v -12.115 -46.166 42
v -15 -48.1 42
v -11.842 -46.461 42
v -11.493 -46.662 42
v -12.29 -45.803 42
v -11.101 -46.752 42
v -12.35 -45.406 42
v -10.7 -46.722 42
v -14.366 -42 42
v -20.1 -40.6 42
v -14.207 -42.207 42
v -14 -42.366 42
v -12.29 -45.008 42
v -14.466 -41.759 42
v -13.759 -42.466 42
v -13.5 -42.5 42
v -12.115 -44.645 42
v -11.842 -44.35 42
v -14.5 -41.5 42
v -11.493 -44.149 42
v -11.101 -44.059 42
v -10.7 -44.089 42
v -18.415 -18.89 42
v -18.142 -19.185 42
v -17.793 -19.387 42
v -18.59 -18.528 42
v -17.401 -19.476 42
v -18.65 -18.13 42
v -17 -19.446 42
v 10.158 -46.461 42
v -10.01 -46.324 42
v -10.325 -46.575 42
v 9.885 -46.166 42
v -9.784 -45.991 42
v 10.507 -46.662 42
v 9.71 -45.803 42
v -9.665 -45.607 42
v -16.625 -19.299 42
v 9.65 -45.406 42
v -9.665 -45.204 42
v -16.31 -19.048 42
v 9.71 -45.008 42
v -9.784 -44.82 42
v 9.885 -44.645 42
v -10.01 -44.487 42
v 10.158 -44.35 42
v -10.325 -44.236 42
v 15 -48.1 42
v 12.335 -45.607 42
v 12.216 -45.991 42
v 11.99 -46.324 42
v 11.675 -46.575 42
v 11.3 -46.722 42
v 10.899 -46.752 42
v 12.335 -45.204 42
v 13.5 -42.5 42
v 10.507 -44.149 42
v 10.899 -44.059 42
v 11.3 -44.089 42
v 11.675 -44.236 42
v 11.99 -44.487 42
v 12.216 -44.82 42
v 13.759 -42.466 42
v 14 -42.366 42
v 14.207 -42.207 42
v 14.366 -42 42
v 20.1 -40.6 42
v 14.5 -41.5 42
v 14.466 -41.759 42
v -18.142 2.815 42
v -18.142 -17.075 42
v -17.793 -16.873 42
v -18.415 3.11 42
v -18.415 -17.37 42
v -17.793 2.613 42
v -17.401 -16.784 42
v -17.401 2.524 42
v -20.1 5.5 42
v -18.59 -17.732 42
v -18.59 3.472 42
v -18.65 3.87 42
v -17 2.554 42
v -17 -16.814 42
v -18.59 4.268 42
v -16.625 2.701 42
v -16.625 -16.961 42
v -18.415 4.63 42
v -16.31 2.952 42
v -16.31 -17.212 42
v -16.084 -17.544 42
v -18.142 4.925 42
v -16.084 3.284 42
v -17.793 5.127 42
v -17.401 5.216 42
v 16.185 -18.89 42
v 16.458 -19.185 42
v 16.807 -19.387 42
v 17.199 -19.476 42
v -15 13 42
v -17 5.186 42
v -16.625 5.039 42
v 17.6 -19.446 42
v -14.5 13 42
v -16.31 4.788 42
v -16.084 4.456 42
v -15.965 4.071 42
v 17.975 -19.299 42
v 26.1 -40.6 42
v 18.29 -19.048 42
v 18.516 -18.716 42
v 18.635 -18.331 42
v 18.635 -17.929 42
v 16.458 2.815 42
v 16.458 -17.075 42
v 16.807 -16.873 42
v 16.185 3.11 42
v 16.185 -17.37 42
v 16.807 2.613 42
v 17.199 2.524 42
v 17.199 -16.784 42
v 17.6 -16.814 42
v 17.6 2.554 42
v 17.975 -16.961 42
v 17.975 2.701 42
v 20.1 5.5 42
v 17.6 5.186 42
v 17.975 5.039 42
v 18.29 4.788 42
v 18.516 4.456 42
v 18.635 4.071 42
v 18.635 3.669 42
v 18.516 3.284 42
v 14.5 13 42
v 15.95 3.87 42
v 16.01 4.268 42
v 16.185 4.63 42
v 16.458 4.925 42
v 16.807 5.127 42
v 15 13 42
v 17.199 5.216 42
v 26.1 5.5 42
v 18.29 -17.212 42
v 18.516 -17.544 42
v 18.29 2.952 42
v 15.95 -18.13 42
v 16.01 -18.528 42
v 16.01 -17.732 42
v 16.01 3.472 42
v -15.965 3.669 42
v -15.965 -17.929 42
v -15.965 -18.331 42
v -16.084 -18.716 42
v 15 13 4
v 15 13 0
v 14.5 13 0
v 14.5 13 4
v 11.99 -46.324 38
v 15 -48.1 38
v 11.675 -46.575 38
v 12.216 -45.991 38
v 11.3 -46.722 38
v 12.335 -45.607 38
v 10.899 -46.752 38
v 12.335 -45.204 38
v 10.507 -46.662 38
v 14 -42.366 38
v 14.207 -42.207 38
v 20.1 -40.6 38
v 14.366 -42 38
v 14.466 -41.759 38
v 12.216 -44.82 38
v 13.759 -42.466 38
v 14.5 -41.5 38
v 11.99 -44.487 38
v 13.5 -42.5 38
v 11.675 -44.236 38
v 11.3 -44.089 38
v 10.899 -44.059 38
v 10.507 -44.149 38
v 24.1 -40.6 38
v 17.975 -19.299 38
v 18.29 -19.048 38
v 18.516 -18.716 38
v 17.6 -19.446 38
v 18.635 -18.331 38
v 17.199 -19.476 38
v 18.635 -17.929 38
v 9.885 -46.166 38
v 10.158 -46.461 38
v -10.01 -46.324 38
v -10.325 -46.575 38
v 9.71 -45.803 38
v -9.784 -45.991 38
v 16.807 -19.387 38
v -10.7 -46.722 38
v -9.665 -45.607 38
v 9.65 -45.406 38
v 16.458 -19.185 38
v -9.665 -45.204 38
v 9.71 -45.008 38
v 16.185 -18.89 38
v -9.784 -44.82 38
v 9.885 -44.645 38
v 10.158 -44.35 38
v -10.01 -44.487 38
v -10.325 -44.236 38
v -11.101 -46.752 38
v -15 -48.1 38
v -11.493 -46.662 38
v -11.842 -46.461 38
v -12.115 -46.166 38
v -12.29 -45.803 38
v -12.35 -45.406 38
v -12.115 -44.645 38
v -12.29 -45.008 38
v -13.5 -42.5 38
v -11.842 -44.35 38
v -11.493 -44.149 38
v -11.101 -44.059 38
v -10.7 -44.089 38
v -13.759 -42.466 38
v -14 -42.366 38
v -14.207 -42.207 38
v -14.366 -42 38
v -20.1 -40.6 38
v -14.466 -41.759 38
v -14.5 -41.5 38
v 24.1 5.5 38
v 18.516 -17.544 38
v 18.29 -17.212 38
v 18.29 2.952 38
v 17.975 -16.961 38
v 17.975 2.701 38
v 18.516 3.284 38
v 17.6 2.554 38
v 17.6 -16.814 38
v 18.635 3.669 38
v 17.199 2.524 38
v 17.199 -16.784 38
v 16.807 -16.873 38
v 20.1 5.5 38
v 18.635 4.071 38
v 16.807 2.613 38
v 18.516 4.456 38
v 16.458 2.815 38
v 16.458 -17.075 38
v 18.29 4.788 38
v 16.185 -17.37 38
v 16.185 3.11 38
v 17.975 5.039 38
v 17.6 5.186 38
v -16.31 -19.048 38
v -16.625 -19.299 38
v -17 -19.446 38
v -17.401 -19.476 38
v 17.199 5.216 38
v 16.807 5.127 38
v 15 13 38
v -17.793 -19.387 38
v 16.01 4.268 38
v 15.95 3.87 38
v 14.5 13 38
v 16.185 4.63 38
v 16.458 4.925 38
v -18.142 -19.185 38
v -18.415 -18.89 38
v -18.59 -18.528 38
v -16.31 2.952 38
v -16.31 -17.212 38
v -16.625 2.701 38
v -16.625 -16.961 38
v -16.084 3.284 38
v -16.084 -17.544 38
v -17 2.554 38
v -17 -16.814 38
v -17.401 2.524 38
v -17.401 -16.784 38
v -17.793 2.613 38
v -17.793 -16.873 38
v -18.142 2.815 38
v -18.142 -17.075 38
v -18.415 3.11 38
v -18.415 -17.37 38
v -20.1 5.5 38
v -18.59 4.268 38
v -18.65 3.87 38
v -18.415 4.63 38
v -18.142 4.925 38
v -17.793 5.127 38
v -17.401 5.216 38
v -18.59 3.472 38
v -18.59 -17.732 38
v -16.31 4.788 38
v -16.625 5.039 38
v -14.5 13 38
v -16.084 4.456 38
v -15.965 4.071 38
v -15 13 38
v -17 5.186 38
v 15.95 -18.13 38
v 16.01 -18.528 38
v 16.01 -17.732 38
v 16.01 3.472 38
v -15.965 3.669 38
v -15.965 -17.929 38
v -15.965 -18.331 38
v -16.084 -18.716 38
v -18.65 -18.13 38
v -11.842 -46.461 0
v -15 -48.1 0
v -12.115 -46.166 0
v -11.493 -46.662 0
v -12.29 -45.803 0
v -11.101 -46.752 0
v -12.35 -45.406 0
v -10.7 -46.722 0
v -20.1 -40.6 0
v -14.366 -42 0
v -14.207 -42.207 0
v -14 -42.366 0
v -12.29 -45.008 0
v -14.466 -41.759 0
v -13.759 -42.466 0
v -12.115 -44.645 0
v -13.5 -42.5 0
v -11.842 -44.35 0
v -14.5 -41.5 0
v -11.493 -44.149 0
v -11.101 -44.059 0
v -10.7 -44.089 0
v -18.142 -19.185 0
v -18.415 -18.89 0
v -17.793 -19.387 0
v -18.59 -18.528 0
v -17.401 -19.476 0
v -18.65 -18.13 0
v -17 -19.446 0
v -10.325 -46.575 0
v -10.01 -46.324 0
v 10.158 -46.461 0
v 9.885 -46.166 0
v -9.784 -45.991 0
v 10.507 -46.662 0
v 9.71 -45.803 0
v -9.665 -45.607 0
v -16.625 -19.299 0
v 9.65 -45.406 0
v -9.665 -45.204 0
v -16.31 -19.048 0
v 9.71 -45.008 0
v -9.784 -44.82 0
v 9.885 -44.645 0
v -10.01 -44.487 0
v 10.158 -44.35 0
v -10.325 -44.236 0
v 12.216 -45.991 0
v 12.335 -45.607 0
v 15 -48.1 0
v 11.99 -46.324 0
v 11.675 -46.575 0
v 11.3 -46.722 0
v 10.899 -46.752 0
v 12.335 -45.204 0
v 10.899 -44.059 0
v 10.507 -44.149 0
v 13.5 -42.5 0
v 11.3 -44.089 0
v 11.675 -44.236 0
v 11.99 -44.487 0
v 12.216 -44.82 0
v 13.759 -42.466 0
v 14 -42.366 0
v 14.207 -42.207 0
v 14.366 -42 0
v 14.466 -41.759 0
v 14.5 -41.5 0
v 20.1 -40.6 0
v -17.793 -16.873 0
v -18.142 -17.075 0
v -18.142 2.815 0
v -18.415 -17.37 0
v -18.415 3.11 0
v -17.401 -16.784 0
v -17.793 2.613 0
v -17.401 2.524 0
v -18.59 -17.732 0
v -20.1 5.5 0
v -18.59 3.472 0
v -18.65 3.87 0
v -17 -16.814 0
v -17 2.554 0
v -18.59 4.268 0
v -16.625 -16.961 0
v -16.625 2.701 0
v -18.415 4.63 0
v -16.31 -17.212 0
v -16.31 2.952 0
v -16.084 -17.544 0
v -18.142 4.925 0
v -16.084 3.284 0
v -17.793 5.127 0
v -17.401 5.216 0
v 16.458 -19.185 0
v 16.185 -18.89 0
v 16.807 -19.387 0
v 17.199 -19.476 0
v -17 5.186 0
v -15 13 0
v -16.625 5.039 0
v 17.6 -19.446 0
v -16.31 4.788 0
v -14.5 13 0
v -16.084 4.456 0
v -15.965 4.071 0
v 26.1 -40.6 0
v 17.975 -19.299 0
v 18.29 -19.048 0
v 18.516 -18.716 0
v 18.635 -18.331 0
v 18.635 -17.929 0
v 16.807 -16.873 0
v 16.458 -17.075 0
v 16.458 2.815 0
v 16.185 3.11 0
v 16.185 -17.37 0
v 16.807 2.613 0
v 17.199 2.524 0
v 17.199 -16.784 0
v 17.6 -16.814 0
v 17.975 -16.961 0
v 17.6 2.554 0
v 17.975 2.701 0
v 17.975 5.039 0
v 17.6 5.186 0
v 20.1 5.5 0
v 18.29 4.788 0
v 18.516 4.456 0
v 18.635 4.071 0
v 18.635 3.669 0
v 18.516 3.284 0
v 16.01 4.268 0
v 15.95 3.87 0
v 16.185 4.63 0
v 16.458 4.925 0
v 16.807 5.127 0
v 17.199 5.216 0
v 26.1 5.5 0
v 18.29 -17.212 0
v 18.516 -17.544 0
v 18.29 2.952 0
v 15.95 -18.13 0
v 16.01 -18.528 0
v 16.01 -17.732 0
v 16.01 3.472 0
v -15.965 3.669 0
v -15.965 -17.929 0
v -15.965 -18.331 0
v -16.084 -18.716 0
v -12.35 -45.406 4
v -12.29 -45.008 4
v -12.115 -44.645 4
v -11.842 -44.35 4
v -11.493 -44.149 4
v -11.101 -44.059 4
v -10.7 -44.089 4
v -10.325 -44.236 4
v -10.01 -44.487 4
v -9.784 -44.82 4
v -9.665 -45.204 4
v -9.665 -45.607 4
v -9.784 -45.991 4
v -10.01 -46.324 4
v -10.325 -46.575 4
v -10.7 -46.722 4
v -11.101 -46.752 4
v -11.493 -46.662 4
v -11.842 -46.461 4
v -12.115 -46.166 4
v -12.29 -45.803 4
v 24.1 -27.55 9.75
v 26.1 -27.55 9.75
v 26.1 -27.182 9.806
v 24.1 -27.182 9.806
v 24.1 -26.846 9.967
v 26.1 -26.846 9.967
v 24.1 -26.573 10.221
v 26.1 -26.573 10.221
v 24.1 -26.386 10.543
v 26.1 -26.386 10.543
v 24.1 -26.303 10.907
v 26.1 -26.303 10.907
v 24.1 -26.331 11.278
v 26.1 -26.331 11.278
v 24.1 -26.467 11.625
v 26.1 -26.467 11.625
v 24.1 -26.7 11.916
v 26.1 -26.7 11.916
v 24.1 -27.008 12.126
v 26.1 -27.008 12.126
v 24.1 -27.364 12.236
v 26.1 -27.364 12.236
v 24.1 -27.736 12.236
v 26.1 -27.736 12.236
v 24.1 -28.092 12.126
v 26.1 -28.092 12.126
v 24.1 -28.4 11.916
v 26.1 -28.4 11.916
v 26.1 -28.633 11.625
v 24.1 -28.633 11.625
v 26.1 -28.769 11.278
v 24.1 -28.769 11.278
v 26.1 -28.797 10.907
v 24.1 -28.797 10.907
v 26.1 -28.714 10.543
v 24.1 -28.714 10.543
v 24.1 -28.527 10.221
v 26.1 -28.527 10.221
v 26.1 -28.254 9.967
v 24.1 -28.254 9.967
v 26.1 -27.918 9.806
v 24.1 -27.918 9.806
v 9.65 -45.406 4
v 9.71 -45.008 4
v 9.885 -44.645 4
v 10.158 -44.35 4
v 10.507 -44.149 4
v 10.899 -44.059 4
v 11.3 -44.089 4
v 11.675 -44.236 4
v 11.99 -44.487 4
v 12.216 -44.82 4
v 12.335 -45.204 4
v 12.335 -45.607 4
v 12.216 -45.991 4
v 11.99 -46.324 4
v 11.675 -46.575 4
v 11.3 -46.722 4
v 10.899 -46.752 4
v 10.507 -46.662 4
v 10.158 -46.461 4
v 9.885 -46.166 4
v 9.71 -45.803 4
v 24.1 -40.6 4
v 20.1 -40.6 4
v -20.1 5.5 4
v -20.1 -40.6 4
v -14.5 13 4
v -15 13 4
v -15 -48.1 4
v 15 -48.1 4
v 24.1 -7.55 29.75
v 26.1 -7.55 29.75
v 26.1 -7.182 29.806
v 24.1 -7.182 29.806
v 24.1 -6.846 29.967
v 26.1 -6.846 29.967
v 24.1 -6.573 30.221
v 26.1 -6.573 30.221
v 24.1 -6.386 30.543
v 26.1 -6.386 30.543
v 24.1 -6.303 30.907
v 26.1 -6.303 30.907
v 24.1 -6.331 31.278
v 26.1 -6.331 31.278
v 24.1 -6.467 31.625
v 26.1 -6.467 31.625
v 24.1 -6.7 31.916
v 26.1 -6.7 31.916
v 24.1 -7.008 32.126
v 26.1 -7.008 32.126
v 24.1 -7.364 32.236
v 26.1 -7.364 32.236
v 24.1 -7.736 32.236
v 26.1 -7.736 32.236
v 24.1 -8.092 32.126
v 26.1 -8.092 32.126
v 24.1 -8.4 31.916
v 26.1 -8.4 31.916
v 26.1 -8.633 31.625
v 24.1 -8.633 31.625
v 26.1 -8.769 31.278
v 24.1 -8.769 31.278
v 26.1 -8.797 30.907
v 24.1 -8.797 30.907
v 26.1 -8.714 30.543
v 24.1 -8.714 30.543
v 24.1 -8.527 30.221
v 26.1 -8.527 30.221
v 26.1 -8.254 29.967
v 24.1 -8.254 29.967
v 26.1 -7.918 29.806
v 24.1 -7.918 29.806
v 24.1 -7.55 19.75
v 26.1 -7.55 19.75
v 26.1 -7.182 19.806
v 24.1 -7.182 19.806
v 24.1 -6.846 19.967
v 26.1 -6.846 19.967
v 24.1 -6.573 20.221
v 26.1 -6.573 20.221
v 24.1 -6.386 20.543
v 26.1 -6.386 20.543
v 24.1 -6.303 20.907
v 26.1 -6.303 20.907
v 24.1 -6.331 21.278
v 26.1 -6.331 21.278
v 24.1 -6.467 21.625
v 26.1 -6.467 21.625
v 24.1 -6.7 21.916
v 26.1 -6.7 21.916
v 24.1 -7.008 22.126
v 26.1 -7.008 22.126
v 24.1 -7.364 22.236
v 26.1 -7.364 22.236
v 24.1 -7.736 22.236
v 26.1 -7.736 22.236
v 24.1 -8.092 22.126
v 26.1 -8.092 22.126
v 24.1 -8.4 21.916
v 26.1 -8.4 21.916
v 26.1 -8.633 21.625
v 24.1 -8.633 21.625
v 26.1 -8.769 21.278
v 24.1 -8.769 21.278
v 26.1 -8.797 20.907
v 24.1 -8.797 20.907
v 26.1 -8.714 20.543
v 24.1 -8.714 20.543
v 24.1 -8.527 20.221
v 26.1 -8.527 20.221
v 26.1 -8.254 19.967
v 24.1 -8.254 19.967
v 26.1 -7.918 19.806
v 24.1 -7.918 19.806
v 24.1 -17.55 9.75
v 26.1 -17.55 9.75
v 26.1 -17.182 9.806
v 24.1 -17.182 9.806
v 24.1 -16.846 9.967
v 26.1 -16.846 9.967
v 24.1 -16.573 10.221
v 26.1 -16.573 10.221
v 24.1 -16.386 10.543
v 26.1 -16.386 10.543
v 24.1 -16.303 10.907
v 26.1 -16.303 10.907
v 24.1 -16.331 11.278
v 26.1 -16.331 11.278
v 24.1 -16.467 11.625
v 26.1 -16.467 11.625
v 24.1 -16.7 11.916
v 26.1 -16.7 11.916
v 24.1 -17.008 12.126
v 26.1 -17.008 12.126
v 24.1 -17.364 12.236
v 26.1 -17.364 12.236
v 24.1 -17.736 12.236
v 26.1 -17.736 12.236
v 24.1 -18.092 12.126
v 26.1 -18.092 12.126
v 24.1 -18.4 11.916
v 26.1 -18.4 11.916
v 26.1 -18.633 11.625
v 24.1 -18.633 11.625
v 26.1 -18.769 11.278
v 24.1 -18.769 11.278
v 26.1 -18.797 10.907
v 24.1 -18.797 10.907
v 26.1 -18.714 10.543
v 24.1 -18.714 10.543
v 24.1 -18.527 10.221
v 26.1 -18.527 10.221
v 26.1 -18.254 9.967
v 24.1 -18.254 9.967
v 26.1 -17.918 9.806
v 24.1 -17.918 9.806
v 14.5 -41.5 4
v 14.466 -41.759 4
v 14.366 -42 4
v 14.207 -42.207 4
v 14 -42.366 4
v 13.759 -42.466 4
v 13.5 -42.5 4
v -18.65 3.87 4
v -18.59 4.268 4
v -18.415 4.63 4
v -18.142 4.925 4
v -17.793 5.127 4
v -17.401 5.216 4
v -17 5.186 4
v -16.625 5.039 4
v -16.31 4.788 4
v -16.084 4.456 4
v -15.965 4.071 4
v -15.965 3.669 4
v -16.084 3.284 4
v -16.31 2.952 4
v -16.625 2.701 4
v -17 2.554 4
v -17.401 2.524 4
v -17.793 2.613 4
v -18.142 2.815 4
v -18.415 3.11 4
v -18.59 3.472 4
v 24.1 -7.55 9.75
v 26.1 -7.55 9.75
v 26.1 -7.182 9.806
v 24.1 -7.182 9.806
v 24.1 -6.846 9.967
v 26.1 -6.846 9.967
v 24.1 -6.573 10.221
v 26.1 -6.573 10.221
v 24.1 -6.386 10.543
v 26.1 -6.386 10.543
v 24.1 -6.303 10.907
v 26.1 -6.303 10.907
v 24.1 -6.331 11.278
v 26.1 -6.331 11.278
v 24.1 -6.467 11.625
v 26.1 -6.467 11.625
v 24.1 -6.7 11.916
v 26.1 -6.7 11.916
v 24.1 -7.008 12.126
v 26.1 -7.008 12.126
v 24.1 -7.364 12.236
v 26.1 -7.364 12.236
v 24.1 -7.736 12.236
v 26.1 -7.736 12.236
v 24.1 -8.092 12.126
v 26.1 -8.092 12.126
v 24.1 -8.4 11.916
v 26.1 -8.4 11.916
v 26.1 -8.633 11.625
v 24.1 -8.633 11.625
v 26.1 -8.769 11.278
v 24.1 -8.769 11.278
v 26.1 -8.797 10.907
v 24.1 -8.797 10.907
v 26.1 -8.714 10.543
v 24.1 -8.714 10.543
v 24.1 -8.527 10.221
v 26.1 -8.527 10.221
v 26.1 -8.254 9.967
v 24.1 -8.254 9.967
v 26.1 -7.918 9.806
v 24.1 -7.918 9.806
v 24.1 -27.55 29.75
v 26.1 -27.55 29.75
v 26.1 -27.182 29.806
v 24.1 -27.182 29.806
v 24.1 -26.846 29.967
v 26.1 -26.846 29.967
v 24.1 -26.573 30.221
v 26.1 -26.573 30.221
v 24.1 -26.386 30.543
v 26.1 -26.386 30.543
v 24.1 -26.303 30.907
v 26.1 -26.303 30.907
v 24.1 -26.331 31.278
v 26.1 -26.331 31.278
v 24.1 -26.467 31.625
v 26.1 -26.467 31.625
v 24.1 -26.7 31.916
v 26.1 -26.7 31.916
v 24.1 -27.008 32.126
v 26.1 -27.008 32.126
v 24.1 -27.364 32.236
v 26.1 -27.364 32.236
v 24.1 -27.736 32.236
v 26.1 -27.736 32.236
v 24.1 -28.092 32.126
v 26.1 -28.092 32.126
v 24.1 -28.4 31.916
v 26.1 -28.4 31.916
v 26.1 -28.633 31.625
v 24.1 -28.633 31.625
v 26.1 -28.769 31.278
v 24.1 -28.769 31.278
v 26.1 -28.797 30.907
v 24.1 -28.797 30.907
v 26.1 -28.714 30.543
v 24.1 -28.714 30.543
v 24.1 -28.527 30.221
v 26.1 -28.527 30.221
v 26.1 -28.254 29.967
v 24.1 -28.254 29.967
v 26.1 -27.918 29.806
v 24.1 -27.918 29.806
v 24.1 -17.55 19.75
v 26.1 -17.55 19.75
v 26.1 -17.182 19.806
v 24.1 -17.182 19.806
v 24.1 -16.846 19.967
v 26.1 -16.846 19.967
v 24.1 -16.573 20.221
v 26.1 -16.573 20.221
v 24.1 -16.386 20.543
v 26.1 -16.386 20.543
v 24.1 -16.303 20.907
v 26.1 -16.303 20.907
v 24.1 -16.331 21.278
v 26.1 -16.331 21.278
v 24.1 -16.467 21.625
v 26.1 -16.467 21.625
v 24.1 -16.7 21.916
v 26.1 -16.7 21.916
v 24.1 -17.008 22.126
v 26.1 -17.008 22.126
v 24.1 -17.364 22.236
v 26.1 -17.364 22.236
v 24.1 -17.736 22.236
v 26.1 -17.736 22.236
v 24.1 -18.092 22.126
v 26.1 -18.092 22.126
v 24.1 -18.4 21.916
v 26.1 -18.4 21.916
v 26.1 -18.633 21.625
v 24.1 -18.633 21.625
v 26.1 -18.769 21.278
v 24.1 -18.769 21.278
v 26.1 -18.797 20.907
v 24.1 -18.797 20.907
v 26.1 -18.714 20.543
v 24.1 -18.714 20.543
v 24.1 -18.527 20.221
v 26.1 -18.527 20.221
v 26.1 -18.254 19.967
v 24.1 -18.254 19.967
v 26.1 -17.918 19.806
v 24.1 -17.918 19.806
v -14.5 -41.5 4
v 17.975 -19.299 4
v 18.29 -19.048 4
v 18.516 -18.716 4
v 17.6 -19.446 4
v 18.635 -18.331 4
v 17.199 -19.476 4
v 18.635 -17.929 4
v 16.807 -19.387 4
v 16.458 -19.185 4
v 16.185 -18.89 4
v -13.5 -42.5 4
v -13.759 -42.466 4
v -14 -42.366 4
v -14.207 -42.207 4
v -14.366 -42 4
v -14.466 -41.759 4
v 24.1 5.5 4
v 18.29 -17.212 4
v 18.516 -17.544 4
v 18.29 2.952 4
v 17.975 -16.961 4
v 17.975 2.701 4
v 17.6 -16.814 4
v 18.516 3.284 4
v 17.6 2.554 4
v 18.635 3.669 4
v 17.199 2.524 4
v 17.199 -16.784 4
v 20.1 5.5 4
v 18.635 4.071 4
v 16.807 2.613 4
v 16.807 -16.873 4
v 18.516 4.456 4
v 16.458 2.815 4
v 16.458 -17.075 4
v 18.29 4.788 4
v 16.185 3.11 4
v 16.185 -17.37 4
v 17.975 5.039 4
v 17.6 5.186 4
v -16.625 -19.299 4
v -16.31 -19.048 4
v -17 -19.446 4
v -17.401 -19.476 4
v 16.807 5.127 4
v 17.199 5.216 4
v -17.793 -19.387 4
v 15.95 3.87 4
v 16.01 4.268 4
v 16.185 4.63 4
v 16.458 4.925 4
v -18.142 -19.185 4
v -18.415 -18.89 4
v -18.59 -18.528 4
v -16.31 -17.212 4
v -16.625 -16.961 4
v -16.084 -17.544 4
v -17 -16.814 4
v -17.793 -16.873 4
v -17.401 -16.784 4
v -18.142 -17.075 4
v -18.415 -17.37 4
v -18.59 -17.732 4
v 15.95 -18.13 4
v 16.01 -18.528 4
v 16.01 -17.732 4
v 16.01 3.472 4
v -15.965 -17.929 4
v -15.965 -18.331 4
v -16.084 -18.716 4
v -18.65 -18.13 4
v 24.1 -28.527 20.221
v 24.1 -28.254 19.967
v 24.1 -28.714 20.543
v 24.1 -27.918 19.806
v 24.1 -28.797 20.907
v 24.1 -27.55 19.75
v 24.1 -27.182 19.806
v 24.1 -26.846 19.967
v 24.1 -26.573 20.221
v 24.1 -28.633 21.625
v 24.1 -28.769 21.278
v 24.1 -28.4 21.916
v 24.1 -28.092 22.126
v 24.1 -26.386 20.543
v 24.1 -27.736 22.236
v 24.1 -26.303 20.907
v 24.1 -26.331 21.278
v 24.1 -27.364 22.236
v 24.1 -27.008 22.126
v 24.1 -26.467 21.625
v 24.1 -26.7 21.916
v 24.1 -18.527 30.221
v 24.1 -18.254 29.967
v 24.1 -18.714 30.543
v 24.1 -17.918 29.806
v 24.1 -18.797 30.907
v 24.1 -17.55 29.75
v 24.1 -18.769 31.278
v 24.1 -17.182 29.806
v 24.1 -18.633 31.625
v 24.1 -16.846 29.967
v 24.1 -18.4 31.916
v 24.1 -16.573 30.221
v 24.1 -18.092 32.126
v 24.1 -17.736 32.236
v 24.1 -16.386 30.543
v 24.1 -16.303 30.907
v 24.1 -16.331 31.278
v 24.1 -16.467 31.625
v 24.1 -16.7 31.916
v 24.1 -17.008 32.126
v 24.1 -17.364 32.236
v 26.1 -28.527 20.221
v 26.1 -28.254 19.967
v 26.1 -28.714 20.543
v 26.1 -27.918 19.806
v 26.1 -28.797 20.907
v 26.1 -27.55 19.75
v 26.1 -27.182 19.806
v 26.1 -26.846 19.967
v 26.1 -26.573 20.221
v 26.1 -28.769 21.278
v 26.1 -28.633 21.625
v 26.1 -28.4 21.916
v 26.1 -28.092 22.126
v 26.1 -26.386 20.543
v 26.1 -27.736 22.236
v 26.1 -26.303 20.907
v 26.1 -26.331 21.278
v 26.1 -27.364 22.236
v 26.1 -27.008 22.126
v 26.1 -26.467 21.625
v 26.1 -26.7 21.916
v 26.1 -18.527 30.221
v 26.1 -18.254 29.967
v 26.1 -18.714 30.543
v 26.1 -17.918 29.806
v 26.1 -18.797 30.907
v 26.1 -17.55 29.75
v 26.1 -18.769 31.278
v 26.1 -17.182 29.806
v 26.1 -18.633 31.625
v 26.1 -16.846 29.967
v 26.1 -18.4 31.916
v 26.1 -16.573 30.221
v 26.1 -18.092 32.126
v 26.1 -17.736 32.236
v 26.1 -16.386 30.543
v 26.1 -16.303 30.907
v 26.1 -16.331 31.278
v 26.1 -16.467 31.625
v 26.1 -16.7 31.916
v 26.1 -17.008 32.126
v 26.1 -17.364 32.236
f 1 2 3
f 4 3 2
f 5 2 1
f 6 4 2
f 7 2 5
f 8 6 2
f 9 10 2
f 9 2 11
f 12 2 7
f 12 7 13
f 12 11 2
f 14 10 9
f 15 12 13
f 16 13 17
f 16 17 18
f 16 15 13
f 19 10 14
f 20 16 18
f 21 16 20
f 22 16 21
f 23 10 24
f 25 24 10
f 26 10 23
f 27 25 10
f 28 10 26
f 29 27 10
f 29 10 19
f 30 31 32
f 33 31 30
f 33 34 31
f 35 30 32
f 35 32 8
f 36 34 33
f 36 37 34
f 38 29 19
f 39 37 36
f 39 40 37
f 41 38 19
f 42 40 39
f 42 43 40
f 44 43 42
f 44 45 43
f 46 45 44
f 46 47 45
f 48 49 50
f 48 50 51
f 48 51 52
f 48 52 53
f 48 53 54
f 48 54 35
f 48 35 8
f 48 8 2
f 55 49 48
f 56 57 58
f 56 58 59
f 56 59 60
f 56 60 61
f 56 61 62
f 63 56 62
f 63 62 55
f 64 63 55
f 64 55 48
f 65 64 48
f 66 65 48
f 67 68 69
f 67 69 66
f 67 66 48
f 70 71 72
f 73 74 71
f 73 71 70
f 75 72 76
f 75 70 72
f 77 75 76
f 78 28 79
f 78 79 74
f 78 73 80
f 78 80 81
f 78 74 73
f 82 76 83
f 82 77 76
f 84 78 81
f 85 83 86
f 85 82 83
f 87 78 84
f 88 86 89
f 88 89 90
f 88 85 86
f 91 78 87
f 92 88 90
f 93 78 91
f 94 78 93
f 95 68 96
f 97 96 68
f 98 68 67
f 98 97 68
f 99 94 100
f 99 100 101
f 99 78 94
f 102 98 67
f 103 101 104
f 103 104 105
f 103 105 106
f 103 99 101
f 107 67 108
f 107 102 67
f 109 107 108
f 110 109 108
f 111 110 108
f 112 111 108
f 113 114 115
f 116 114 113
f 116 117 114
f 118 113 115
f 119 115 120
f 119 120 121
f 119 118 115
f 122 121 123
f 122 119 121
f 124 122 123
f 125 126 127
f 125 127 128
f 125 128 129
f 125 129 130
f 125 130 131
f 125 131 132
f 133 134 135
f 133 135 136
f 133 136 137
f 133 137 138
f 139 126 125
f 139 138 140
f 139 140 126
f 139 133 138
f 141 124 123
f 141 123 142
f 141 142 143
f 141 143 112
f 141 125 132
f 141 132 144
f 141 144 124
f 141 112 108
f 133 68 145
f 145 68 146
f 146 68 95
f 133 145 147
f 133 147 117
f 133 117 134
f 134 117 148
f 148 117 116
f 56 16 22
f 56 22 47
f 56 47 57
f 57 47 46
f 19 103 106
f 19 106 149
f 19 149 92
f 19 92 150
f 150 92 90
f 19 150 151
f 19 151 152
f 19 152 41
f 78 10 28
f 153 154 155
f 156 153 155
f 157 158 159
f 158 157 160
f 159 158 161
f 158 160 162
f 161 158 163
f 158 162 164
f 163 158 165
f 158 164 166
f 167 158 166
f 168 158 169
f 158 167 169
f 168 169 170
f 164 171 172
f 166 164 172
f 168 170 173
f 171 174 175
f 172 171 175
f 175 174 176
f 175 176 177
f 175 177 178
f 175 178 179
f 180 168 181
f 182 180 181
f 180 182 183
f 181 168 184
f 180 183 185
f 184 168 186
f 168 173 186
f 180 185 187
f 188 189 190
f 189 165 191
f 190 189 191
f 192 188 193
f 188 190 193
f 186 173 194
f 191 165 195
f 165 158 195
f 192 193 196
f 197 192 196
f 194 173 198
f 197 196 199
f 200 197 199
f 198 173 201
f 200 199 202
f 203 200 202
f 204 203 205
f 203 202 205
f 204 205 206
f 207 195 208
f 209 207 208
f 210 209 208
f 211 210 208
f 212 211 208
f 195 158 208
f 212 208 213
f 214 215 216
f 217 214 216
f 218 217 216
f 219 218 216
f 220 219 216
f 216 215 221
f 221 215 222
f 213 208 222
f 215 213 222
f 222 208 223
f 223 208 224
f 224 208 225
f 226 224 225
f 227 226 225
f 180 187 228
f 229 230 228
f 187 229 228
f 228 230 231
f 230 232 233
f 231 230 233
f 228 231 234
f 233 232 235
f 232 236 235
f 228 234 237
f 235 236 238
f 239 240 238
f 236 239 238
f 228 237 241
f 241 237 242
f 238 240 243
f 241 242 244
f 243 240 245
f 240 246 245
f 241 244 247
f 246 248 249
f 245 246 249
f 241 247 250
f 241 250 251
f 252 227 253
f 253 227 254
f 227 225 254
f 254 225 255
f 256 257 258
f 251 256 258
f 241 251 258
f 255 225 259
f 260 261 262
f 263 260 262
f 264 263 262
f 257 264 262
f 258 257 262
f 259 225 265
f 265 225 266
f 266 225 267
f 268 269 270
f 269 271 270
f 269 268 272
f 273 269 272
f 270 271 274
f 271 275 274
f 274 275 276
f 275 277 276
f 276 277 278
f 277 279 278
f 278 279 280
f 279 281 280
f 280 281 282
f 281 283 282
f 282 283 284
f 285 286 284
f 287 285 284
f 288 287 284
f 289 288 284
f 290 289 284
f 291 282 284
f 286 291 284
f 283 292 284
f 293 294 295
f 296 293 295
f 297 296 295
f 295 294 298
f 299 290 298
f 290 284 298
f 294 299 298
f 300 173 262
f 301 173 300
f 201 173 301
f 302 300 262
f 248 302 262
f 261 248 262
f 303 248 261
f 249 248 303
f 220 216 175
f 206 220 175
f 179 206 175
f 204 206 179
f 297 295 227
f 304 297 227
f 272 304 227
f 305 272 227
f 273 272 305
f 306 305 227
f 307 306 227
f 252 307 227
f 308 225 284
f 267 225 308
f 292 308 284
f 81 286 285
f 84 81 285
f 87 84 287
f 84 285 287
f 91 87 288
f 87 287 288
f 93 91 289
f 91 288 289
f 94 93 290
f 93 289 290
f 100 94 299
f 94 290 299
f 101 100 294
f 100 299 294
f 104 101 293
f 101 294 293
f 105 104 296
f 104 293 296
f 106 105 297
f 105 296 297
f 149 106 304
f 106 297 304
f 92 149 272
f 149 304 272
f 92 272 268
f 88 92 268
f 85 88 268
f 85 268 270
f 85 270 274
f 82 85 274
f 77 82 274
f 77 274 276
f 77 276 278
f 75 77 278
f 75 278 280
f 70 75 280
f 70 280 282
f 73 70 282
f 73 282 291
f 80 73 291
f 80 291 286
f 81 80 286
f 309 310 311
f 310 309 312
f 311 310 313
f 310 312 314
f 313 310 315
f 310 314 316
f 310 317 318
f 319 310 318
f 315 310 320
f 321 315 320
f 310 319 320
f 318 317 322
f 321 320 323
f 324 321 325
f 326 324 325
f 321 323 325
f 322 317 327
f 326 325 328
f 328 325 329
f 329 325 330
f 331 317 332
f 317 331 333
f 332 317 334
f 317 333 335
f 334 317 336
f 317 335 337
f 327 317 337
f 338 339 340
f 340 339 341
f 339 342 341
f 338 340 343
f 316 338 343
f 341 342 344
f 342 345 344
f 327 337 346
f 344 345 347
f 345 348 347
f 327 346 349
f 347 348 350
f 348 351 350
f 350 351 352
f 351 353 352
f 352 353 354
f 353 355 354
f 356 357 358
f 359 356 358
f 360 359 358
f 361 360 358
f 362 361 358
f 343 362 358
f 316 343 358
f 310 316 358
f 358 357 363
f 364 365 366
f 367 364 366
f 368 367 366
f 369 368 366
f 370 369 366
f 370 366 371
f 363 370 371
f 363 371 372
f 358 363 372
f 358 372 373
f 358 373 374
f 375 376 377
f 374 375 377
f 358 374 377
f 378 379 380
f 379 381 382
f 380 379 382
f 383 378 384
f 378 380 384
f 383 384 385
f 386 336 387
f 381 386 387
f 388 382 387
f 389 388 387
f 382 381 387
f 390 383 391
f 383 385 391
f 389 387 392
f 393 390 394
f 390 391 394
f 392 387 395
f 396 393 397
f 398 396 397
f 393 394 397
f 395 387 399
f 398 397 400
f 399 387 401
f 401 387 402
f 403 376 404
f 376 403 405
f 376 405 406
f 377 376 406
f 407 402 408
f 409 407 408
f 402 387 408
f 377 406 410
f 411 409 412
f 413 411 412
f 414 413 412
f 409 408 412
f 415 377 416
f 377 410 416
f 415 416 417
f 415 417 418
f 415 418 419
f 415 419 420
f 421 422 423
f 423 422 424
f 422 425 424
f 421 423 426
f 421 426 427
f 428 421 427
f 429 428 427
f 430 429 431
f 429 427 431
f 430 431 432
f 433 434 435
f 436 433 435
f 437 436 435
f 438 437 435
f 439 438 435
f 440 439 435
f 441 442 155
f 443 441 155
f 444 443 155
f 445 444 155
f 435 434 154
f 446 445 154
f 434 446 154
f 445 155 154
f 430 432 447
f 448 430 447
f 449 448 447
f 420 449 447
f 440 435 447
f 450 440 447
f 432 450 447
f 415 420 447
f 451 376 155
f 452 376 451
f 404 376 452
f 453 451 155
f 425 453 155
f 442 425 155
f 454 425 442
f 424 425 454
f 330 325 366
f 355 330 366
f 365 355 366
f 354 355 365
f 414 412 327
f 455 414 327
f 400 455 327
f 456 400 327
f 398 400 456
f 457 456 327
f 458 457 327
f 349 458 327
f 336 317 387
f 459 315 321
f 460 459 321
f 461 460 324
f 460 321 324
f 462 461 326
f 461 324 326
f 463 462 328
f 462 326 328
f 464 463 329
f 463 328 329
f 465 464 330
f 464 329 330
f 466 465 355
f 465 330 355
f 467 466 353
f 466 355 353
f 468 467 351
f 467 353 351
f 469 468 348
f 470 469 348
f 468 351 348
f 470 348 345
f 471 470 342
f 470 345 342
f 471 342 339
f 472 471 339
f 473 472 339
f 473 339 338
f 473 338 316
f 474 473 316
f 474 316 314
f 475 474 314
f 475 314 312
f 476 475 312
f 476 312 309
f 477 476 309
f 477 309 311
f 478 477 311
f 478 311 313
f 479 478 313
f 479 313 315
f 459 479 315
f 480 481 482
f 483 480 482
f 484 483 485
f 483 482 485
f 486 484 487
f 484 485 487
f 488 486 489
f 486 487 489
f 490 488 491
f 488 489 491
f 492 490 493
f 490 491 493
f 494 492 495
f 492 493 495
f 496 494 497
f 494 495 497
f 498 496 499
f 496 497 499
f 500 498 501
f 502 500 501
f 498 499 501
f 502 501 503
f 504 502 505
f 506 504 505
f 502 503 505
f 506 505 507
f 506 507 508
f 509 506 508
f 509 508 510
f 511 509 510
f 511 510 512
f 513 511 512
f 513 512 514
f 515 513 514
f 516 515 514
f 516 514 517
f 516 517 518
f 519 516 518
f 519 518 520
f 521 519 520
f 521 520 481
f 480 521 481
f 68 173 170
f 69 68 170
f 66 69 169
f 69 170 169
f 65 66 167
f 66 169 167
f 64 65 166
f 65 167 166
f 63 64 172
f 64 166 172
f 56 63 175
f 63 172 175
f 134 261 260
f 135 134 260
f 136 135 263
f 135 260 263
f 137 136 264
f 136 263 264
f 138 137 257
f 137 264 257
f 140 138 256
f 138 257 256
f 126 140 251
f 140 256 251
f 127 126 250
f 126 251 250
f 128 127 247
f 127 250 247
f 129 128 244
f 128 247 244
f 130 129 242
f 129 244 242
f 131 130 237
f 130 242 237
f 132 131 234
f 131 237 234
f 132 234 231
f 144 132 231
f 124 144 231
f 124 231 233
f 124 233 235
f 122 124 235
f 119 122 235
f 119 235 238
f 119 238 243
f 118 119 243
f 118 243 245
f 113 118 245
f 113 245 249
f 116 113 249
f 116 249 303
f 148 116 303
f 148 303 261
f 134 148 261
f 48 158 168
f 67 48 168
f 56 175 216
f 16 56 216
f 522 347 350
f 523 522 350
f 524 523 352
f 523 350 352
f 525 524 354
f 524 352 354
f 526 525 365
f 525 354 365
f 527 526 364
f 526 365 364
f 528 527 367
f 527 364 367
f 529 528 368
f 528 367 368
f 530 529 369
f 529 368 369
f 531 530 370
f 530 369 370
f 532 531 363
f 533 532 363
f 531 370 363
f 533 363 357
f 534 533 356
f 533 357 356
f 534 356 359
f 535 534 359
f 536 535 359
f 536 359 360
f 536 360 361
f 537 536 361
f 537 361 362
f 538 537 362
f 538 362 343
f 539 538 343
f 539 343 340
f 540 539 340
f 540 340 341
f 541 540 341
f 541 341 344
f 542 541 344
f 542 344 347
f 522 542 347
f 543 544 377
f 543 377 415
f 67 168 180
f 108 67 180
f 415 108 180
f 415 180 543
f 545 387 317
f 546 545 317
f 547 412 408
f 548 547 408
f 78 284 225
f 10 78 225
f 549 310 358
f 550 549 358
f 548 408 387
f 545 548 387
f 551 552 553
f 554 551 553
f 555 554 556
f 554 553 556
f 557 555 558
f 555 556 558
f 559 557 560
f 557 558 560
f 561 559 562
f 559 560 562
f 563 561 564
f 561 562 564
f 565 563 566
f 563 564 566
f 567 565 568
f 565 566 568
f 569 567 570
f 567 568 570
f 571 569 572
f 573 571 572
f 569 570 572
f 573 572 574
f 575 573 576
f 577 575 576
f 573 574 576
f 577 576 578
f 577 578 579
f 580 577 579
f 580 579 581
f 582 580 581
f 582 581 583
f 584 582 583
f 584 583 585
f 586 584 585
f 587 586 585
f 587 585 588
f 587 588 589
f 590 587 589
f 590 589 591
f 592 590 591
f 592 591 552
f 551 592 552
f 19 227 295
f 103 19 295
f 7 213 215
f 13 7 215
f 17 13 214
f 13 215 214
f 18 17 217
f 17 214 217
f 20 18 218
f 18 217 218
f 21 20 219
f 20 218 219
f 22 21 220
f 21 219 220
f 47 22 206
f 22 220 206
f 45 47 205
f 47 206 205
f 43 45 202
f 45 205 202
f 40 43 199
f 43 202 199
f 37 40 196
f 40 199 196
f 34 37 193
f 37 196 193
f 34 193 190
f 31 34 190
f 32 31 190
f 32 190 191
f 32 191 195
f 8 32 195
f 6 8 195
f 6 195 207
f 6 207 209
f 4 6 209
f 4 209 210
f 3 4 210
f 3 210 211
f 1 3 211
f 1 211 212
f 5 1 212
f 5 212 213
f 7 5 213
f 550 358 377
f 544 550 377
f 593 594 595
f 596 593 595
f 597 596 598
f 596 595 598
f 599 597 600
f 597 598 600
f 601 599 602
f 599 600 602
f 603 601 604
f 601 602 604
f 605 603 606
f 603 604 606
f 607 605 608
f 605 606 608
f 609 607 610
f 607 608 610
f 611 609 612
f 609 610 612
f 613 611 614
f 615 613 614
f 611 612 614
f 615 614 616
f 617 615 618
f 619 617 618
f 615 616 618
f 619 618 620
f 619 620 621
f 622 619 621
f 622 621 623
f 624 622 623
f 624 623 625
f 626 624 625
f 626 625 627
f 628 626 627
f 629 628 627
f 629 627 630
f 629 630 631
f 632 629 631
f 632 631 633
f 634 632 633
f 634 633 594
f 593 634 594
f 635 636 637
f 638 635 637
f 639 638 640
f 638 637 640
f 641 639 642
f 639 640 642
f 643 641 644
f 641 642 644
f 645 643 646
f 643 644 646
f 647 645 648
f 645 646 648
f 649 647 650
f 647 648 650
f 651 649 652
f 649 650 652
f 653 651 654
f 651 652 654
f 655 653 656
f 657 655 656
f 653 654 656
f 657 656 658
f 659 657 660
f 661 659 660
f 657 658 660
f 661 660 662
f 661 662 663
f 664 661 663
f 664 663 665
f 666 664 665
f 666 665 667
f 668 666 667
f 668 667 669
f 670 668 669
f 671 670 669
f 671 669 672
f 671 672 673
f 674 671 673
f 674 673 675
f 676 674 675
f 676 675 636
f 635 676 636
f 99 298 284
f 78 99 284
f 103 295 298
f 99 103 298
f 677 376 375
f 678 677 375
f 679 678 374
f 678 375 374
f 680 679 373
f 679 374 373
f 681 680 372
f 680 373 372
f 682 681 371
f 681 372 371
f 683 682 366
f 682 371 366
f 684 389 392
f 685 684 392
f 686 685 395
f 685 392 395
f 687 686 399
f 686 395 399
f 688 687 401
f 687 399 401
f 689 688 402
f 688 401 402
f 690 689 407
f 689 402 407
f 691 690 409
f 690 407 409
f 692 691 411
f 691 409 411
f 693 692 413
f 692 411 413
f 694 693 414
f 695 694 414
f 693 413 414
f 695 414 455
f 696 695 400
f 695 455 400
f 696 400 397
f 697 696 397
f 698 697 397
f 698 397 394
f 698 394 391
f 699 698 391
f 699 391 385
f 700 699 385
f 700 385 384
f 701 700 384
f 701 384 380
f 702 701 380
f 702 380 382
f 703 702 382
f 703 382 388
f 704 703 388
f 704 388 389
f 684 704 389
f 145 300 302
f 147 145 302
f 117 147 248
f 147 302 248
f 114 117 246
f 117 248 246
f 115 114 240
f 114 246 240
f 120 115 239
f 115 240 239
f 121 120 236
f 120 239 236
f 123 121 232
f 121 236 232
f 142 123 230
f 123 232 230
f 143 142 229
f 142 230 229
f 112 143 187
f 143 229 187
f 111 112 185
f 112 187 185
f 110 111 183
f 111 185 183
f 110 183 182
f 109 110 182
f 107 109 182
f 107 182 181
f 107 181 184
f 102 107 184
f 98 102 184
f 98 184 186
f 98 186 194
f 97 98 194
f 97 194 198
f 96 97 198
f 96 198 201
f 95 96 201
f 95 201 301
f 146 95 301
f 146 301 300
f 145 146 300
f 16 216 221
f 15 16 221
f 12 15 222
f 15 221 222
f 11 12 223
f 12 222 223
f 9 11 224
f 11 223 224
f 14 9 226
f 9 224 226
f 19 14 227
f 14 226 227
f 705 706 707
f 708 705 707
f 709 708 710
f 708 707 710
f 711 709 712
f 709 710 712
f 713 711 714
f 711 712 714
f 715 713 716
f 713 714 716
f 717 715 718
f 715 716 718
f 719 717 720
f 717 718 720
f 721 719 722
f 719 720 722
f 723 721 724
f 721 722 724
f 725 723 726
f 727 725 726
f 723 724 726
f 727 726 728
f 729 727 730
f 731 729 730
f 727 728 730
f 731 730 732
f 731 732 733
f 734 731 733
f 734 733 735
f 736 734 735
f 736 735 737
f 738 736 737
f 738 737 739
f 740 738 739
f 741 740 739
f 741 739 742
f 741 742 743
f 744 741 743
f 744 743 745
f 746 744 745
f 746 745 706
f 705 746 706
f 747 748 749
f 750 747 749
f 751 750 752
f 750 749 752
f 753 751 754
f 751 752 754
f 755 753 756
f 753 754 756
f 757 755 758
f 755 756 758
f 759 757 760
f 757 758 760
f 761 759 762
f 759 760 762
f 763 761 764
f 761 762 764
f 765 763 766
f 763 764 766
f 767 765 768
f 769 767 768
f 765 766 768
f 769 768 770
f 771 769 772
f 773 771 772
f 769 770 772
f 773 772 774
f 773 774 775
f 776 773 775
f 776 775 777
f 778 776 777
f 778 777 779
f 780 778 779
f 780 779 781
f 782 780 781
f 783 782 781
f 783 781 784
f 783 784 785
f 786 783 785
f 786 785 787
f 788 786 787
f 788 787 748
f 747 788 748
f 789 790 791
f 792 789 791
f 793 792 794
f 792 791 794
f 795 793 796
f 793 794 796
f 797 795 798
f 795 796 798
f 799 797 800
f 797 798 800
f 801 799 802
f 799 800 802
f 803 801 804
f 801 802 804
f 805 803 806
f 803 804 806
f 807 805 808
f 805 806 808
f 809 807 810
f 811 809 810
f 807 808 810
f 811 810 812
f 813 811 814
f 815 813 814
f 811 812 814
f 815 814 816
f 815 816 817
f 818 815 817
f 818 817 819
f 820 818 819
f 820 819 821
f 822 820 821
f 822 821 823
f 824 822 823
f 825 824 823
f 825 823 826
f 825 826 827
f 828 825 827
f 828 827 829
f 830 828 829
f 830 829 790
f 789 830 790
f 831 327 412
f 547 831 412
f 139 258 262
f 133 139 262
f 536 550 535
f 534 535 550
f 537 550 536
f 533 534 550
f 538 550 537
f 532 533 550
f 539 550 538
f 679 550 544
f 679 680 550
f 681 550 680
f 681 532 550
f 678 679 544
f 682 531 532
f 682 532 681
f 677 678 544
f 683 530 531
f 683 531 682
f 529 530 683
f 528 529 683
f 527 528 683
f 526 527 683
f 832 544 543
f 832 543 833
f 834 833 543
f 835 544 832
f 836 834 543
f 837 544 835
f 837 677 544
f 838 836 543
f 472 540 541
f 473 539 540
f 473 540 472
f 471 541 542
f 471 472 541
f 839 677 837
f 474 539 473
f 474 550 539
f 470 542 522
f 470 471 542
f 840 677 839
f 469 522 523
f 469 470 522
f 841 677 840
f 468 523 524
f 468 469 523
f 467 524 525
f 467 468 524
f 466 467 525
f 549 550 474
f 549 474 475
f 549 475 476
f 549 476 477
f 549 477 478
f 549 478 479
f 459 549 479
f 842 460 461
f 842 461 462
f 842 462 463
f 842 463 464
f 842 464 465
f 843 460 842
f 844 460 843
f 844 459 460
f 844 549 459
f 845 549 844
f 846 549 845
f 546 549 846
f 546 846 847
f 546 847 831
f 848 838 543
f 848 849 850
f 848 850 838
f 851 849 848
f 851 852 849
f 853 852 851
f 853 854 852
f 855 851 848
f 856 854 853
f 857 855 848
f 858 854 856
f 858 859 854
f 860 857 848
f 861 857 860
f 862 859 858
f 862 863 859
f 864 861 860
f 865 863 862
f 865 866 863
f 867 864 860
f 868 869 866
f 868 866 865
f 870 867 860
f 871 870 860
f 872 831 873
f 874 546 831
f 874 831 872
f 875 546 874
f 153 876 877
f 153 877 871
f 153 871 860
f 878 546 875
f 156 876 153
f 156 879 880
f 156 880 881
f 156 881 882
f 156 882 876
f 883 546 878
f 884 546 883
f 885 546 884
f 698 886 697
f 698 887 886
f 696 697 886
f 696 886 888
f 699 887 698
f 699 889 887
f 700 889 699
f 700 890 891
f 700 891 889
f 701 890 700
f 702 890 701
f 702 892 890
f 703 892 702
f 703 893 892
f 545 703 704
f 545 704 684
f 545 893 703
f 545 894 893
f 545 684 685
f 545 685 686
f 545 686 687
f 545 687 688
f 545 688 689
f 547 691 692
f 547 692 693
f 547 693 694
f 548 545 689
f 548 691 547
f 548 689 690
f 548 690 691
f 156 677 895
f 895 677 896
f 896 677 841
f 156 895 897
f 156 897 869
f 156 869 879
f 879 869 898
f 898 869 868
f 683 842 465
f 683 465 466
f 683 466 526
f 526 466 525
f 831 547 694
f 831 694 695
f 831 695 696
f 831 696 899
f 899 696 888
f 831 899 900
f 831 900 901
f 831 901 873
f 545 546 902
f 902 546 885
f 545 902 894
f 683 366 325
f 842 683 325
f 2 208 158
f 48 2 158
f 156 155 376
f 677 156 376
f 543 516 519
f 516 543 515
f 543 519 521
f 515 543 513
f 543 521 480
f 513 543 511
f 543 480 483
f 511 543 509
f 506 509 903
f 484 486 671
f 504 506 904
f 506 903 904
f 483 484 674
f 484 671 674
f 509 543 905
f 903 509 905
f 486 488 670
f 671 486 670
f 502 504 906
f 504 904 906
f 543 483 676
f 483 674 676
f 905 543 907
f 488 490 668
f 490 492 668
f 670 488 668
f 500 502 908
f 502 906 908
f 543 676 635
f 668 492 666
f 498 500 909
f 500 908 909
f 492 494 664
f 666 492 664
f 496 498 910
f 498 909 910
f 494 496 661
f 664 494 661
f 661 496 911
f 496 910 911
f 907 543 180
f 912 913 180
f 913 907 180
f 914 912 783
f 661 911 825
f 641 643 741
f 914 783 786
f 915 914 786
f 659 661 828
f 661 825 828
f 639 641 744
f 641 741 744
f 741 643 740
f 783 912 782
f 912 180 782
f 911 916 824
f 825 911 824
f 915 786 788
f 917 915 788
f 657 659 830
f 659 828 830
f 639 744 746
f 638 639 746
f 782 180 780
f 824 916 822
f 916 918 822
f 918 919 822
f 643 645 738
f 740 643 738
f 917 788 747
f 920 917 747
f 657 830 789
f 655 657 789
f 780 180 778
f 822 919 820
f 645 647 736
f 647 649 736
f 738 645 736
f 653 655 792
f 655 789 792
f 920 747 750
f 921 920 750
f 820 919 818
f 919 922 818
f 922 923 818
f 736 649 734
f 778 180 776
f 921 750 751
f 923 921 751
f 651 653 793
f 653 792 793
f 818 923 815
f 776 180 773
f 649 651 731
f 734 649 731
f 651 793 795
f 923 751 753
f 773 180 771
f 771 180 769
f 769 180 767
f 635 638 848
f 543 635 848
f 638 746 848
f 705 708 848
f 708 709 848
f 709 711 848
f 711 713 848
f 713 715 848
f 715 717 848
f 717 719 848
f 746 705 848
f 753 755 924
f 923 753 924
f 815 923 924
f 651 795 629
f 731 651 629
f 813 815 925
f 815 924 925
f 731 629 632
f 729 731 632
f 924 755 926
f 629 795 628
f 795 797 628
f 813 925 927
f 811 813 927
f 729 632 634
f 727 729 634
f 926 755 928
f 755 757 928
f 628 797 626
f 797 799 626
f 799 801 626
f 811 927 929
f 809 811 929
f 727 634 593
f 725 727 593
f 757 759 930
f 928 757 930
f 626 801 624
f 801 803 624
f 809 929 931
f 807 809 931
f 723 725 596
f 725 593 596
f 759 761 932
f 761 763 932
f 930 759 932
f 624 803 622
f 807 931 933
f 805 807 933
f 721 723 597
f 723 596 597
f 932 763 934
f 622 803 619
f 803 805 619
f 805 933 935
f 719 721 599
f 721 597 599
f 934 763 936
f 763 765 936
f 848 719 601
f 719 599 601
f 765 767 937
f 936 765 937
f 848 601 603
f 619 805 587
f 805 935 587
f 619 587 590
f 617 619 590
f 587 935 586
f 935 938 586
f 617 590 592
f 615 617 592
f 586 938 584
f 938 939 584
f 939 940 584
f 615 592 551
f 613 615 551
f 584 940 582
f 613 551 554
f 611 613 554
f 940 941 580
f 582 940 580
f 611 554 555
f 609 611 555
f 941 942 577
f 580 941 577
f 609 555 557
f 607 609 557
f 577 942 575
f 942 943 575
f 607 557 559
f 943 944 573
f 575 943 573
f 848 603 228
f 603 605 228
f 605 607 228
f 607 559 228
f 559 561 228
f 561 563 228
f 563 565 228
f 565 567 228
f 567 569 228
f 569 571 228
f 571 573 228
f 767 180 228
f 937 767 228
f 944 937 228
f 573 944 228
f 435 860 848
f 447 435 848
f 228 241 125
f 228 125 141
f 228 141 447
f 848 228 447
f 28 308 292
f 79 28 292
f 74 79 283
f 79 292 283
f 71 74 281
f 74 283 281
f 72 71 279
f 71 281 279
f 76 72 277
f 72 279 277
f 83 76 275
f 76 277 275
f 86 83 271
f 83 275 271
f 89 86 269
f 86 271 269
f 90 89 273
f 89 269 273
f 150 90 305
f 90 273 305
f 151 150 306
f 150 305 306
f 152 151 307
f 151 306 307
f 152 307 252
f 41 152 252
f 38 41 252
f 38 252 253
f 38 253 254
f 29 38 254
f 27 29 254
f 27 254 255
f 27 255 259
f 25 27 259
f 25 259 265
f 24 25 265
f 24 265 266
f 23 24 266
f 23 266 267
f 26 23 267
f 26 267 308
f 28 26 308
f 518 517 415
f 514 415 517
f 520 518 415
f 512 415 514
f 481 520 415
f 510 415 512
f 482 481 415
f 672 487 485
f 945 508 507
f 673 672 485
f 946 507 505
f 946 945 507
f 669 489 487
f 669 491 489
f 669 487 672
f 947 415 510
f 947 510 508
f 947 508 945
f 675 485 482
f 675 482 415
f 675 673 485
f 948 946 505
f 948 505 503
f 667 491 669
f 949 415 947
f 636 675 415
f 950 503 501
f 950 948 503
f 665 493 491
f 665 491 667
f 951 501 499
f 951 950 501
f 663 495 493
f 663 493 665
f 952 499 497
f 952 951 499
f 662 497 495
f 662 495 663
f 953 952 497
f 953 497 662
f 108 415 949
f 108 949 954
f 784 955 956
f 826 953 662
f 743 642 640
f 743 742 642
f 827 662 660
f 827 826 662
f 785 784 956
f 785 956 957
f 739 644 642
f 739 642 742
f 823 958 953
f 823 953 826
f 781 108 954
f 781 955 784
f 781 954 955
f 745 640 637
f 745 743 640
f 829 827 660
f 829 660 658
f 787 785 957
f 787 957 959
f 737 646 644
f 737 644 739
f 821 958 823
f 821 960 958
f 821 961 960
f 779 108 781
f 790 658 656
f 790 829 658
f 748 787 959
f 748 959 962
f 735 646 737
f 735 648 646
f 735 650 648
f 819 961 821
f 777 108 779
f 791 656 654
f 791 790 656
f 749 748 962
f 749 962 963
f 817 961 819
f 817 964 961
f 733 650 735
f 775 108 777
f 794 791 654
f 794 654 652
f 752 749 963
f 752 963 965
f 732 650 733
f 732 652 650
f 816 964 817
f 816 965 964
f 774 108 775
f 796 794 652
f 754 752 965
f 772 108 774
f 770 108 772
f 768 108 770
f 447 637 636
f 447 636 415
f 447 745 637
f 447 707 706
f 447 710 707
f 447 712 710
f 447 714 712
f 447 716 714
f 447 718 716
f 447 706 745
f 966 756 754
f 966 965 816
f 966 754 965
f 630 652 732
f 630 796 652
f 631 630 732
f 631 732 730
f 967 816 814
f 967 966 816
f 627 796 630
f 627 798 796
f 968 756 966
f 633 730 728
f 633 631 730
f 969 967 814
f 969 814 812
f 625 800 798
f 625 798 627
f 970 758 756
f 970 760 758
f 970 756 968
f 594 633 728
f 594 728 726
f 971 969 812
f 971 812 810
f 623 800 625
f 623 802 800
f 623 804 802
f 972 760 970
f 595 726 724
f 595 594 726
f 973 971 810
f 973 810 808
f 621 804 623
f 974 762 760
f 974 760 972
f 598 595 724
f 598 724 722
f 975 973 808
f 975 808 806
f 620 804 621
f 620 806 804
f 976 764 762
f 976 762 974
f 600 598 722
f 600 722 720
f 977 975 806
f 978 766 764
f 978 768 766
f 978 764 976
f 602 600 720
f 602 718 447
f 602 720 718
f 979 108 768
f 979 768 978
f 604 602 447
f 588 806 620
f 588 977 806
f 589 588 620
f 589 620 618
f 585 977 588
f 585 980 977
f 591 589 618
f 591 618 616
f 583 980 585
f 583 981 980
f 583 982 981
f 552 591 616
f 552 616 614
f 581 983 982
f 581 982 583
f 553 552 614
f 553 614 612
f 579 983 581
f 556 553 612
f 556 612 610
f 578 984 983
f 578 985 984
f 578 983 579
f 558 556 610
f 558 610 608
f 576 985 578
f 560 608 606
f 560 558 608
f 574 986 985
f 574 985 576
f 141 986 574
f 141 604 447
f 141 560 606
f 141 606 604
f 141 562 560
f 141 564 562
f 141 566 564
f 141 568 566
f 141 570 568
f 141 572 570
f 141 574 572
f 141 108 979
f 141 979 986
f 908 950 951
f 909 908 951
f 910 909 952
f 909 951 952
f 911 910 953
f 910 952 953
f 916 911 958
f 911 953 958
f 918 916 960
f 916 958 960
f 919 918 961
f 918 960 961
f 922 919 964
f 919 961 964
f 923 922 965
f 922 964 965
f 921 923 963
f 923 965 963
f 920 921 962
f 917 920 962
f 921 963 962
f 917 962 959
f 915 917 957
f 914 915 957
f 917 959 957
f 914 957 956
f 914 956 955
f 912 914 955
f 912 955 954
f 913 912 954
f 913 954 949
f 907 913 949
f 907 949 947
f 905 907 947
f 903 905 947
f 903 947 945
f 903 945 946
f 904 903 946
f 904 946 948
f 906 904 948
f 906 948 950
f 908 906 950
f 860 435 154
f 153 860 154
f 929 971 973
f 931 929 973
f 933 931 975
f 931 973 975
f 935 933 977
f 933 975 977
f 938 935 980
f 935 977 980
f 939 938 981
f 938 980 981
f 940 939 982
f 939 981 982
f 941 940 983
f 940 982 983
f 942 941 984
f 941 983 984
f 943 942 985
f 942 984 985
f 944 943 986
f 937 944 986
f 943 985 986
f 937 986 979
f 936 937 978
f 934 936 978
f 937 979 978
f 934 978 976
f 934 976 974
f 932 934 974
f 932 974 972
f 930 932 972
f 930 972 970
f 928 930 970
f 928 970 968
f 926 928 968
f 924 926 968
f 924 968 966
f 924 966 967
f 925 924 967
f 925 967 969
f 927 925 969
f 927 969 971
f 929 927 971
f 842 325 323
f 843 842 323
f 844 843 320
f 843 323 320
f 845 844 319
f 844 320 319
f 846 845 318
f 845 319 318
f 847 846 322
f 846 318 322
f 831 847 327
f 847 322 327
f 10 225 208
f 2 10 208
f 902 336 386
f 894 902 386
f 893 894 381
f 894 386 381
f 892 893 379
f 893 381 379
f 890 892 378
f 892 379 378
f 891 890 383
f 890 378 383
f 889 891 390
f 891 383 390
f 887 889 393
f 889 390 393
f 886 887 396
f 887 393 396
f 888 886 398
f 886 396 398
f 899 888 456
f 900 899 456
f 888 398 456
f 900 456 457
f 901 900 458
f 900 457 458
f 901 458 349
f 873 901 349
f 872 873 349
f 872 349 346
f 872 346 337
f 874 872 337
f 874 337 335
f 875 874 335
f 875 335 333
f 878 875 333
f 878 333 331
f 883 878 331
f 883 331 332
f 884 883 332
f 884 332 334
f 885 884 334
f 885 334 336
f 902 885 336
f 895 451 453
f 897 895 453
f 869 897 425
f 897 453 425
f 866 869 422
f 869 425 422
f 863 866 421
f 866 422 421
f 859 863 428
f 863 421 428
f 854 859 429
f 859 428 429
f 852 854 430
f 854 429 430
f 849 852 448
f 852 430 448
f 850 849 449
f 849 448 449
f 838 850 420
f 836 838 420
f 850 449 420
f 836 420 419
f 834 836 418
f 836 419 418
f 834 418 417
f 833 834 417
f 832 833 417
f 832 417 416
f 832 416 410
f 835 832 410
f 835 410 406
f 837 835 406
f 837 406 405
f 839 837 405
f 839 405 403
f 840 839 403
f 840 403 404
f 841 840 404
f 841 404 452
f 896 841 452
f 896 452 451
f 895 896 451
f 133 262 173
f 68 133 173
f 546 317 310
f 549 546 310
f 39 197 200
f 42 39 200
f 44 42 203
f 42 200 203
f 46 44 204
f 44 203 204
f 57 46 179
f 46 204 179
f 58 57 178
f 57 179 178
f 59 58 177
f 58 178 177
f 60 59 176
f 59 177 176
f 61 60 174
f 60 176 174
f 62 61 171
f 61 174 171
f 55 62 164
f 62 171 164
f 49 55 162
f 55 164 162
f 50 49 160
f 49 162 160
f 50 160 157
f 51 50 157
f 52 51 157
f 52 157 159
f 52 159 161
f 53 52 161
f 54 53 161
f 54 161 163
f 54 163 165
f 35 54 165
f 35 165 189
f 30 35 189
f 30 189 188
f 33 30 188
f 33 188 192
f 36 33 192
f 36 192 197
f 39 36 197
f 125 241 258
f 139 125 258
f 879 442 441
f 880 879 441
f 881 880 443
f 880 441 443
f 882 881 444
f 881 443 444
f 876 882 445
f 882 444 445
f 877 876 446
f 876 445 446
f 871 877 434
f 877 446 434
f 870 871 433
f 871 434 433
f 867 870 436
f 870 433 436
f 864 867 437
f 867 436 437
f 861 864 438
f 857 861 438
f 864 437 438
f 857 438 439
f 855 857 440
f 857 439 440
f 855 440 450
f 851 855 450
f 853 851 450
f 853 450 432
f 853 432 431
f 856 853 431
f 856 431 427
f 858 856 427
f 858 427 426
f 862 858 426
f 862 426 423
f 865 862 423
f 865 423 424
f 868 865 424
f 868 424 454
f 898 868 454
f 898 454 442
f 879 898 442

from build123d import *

# Parameters (mm, degrees)
EXTRUDE_2_DEPTH     = 42
SKETCH_2_R          = 1.35
CUT_EXTRUDE_1_DEPTH = 45
CUT_EXTRUDE_2_DEPTH = 45
SKETCH_4_W          = 4
SKETCH_4_H          = 46.1
EXTRUDE_3_DEPTH     = 4
SKETCH_5_W          = 2
SKETCH_5_H          = 46.1
EXTRUDE_4_DEPTH     = 42
SKETCH_6_R          = 1.25
CUT_EXTRUDE_3_DEPTH = 10


with BuildPart() as part:
    # 스케치1 → 보스-돌출2 (new body)
    with BuildSketch(Plane.XY):
        with BuildLine():
            Line((-14.5, -41.5), (-14.5, 11.5))
            Line((-14.5, 11.5), (-14.5, 13))
            Line((-14.5, 13), (-15, 13))
            Line((-15, 13), (-20.1, 5.5))
            Line((-20.1, 5.5), (-20.1, -40.6))
            Line((-20.1, -40.6), (-15, -48.1))
            Line((-15, -48.1), (15, -48.1))
            Line((15, -48.1), (20.1, -40.6))
            Line((20.1, -40.6), (20.1, 5.5))
            Line((20.1, 5.5), (15, 13))
            Line((15, 13), (14.5, 13))
            Line((14.5, 13), (14.5, 11.5))
            Line((14.5, 11.5), (14.5, -41.5))
            ThreePointArc((14.5, -41.5), (14.207106781, -42.207106781), (13.5, -42.5))
            Line((13.5, -42.5), (-13.5, -42.5))
            ThreePointArc((-13.5, -42.5), (-14.207106781, -42.207106781), (-14.5, -41.5))
        make_face()
    extrude(amount=EXTRUDE_2_DEPTH)

    # 스케치2 → 컷-돌출1 (cut)
    with BuildSketch(Plane(origin=(0, 0, 0), x_dir=(-1, 0, 0), z_dir=(0, 0, -1))):
        with Locations((-11, -45.405560676)):
            Circle(SKETCH_2_R)
        with Locations((11, -45.405560676)):
            Circle(SKETCH_2_R)
        with Locations((17.3, 3.87)):
            Circle(SKETCH_2_R)
        with Locations((17.3, -18.13)):
            Circle(SKETCH_2_R)
        with Locations((-17.3, 3.87)):
            Circle(SKETCH_2_R)
        with Locations((-17.3, -18.13)):
            Circle(SKETCH_2_R)
    extrude(amount=-CUT_EXTRUDE_1_DEPTH, mode=Mode.SUBTRACT)

    # 스케치3 → 컷-돌출2 (cut)
    with BuildSketch(Plane(origin=(20.1, 0, 0), x_dir=(0, 0, -1), z_dir=(1, 0, 0))):
        Polygon((-38, 5.5), (-38, -40.6), (-38, -48.1), (-4, -48.1), (-4, -40.6), (-4, 5.5), (-4, 13), (-38, 13), align=None)
    extrude(amount=-CUT_EXTRUDE_2_DEPTH, mode=Mode.SUBTRACT)


with BuildPart() as cut_extrude_2_piece_1:
    # of the separate pieces the step leaves, piece 1, a body of its own (cut_extrude_2_pieces)
    add(part.part.solids().sort_by_distance((-14.5, -41.5, 38))[0])



with BuildPart() as cut_extrude_2_piece_2:
    # of the separate pieces the step leaves, piece 2, a body of its own (cut_extrude_2_pieces)
    add(part.part.solids().sort_by_distance((-14.5, -41.5, 0))[0])


with BuildPart() as cut_extrude_2_piece_1_1:
    add(cut_extrude_2_piece_1.part)

    add(cut_extrude_2_piece_2.part)  # 보스-돌출3 merges 컷-돌출2 piece 2
    # 스케치4 → 보스-돌출3 (add)
    with BuildSketch(Plane(origin=(20.1, 0, 0), x_dir=(0, 0, -1), z_dir=(1, 0, 0))):
        with Locations((-40, -17.55)):
            Rectangle(SKETCH_4_W, SKETCH_4_H)
        with Locations((-2, -17.55)):
            Rectangle(SKETCH_4_W, SKETCH_4_H)
    extrude(amount=EXTRUDE_3_DEPTH)

    # 스케치5 → 보스-돌출4 (add)
    with BuildSketch(Plane.XY.offset(42)):
        with Locations((25.1, -17.55)):
            Rectangle(SKETCH_5_W, SKETCH_5_H)
    extrude(amount=-EXTRUDE_4_DEPTH)

    # 스케치6 → 컷-돌출3 (cut)
    with BuildSketch(Plane(origin=(26.1, 0, 0), x_dir=(0, 0, -1), z_dir=(1, 0, 0))):
        with Locations((-21, -17.55)):
            Circle(SKETCH_6_R)
        with Locations((-11, -17.55)):
            Circle(SKETCH_6_R)
        with Locations((-31, -17.55)):
            Circle(SKETCH_6_R)
        with Locations((-31, -7.55)):
            Circle(SKETCH_6_R)
        with Locations((-21, -7.55)):
            Circle(SKETCH_6_R)
        with Locations((-11, -7.55)):
            Circle(SKETCH_6_R)
        with Locations((-31, -27.55)):
            Circle(SKETCH_6_R)
        with Locations((-21, -27.55)):
            Circle(SKETCH_6_R)
        with Locations((-11, -27.55)):
            Circle(SKETCH_6_R)
    extrude(amount=-CUT_EXTRUDE_3_DEPTH, mode=Mode.SUBTRACT)


solid = cut_extrude_2_piece_1_1.part
